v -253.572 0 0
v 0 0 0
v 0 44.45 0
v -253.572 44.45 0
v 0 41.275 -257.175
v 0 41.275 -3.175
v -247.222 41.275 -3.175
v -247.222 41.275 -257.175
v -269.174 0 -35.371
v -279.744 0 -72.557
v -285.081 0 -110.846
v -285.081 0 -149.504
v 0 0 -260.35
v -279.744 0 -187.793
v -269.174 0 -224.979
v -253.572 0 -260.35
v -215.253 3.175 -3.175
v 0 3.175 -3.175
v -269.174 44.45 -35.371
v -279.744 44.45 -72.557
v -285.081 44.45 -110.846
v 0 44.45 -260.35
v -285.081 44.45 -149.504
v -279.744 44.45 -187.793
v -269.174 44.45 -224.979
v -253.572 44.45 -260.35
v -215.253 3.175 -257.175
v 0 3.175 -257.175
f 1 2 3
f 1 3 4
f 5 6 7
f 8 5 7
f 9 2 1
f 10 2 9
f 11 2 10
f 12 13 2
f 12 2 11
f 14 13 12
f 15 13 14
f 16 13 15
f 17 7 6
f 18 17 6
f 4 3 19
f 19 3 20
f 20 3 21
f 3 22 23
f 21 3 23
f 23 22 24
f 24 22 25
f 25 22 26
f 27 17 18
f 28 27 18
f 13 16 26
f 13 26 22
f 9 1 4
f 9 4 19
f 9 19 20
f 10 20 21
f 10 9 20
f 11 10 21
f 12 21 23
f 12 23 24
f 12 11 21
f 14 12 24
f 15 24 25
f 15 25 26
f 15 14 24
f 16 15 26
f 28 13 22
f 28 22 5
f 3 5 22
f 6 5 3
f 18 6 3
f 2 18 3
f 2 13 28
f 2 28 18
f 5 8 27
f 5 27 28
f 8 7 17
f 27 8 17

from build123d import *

# Parameters (mm, degrees)
BOSS_EXTRUDE1_DEPTH = 44.45
CUT_EXTRUDE2_DEPTH  = 254


with BuildPart() as part:
    # Sketch1 → Boss-Extrude1 (new body)
    with BuildSketch(Plane(origin=(0, 0, 0), x_dir=(1, 0, 0), z_dir=(0, 1, 0))):
        with BuildLine():
            Line((-253.572226701, 260.35), (0, 260.35))
            Line((0, 260.35), (0, 0))
            Line((0, 0), (-253.572226701, 0))
            ThreePointArc((-253.572226701, 0), (-285.75, 130.175), (-253.572226701, 260.35))
        make_face()
    extrude(amount=BOSS_EXTRUDE1_DEPTH)

    # Sketch2 → Cut-Extrude2 (cut)
    with BuildSketch(Plane.XY.offset(-3.175)):
        Polygon((-247.222226701, 41.275), (-215.252530753, 3.175), (32.837570188, 3.175), (32.837570188, 41.275), align=None)
    extrude(amount=-CUT_EXTRUDE2_DEPTH, mode=Mode.SUBTRACT)


solid = part.part
